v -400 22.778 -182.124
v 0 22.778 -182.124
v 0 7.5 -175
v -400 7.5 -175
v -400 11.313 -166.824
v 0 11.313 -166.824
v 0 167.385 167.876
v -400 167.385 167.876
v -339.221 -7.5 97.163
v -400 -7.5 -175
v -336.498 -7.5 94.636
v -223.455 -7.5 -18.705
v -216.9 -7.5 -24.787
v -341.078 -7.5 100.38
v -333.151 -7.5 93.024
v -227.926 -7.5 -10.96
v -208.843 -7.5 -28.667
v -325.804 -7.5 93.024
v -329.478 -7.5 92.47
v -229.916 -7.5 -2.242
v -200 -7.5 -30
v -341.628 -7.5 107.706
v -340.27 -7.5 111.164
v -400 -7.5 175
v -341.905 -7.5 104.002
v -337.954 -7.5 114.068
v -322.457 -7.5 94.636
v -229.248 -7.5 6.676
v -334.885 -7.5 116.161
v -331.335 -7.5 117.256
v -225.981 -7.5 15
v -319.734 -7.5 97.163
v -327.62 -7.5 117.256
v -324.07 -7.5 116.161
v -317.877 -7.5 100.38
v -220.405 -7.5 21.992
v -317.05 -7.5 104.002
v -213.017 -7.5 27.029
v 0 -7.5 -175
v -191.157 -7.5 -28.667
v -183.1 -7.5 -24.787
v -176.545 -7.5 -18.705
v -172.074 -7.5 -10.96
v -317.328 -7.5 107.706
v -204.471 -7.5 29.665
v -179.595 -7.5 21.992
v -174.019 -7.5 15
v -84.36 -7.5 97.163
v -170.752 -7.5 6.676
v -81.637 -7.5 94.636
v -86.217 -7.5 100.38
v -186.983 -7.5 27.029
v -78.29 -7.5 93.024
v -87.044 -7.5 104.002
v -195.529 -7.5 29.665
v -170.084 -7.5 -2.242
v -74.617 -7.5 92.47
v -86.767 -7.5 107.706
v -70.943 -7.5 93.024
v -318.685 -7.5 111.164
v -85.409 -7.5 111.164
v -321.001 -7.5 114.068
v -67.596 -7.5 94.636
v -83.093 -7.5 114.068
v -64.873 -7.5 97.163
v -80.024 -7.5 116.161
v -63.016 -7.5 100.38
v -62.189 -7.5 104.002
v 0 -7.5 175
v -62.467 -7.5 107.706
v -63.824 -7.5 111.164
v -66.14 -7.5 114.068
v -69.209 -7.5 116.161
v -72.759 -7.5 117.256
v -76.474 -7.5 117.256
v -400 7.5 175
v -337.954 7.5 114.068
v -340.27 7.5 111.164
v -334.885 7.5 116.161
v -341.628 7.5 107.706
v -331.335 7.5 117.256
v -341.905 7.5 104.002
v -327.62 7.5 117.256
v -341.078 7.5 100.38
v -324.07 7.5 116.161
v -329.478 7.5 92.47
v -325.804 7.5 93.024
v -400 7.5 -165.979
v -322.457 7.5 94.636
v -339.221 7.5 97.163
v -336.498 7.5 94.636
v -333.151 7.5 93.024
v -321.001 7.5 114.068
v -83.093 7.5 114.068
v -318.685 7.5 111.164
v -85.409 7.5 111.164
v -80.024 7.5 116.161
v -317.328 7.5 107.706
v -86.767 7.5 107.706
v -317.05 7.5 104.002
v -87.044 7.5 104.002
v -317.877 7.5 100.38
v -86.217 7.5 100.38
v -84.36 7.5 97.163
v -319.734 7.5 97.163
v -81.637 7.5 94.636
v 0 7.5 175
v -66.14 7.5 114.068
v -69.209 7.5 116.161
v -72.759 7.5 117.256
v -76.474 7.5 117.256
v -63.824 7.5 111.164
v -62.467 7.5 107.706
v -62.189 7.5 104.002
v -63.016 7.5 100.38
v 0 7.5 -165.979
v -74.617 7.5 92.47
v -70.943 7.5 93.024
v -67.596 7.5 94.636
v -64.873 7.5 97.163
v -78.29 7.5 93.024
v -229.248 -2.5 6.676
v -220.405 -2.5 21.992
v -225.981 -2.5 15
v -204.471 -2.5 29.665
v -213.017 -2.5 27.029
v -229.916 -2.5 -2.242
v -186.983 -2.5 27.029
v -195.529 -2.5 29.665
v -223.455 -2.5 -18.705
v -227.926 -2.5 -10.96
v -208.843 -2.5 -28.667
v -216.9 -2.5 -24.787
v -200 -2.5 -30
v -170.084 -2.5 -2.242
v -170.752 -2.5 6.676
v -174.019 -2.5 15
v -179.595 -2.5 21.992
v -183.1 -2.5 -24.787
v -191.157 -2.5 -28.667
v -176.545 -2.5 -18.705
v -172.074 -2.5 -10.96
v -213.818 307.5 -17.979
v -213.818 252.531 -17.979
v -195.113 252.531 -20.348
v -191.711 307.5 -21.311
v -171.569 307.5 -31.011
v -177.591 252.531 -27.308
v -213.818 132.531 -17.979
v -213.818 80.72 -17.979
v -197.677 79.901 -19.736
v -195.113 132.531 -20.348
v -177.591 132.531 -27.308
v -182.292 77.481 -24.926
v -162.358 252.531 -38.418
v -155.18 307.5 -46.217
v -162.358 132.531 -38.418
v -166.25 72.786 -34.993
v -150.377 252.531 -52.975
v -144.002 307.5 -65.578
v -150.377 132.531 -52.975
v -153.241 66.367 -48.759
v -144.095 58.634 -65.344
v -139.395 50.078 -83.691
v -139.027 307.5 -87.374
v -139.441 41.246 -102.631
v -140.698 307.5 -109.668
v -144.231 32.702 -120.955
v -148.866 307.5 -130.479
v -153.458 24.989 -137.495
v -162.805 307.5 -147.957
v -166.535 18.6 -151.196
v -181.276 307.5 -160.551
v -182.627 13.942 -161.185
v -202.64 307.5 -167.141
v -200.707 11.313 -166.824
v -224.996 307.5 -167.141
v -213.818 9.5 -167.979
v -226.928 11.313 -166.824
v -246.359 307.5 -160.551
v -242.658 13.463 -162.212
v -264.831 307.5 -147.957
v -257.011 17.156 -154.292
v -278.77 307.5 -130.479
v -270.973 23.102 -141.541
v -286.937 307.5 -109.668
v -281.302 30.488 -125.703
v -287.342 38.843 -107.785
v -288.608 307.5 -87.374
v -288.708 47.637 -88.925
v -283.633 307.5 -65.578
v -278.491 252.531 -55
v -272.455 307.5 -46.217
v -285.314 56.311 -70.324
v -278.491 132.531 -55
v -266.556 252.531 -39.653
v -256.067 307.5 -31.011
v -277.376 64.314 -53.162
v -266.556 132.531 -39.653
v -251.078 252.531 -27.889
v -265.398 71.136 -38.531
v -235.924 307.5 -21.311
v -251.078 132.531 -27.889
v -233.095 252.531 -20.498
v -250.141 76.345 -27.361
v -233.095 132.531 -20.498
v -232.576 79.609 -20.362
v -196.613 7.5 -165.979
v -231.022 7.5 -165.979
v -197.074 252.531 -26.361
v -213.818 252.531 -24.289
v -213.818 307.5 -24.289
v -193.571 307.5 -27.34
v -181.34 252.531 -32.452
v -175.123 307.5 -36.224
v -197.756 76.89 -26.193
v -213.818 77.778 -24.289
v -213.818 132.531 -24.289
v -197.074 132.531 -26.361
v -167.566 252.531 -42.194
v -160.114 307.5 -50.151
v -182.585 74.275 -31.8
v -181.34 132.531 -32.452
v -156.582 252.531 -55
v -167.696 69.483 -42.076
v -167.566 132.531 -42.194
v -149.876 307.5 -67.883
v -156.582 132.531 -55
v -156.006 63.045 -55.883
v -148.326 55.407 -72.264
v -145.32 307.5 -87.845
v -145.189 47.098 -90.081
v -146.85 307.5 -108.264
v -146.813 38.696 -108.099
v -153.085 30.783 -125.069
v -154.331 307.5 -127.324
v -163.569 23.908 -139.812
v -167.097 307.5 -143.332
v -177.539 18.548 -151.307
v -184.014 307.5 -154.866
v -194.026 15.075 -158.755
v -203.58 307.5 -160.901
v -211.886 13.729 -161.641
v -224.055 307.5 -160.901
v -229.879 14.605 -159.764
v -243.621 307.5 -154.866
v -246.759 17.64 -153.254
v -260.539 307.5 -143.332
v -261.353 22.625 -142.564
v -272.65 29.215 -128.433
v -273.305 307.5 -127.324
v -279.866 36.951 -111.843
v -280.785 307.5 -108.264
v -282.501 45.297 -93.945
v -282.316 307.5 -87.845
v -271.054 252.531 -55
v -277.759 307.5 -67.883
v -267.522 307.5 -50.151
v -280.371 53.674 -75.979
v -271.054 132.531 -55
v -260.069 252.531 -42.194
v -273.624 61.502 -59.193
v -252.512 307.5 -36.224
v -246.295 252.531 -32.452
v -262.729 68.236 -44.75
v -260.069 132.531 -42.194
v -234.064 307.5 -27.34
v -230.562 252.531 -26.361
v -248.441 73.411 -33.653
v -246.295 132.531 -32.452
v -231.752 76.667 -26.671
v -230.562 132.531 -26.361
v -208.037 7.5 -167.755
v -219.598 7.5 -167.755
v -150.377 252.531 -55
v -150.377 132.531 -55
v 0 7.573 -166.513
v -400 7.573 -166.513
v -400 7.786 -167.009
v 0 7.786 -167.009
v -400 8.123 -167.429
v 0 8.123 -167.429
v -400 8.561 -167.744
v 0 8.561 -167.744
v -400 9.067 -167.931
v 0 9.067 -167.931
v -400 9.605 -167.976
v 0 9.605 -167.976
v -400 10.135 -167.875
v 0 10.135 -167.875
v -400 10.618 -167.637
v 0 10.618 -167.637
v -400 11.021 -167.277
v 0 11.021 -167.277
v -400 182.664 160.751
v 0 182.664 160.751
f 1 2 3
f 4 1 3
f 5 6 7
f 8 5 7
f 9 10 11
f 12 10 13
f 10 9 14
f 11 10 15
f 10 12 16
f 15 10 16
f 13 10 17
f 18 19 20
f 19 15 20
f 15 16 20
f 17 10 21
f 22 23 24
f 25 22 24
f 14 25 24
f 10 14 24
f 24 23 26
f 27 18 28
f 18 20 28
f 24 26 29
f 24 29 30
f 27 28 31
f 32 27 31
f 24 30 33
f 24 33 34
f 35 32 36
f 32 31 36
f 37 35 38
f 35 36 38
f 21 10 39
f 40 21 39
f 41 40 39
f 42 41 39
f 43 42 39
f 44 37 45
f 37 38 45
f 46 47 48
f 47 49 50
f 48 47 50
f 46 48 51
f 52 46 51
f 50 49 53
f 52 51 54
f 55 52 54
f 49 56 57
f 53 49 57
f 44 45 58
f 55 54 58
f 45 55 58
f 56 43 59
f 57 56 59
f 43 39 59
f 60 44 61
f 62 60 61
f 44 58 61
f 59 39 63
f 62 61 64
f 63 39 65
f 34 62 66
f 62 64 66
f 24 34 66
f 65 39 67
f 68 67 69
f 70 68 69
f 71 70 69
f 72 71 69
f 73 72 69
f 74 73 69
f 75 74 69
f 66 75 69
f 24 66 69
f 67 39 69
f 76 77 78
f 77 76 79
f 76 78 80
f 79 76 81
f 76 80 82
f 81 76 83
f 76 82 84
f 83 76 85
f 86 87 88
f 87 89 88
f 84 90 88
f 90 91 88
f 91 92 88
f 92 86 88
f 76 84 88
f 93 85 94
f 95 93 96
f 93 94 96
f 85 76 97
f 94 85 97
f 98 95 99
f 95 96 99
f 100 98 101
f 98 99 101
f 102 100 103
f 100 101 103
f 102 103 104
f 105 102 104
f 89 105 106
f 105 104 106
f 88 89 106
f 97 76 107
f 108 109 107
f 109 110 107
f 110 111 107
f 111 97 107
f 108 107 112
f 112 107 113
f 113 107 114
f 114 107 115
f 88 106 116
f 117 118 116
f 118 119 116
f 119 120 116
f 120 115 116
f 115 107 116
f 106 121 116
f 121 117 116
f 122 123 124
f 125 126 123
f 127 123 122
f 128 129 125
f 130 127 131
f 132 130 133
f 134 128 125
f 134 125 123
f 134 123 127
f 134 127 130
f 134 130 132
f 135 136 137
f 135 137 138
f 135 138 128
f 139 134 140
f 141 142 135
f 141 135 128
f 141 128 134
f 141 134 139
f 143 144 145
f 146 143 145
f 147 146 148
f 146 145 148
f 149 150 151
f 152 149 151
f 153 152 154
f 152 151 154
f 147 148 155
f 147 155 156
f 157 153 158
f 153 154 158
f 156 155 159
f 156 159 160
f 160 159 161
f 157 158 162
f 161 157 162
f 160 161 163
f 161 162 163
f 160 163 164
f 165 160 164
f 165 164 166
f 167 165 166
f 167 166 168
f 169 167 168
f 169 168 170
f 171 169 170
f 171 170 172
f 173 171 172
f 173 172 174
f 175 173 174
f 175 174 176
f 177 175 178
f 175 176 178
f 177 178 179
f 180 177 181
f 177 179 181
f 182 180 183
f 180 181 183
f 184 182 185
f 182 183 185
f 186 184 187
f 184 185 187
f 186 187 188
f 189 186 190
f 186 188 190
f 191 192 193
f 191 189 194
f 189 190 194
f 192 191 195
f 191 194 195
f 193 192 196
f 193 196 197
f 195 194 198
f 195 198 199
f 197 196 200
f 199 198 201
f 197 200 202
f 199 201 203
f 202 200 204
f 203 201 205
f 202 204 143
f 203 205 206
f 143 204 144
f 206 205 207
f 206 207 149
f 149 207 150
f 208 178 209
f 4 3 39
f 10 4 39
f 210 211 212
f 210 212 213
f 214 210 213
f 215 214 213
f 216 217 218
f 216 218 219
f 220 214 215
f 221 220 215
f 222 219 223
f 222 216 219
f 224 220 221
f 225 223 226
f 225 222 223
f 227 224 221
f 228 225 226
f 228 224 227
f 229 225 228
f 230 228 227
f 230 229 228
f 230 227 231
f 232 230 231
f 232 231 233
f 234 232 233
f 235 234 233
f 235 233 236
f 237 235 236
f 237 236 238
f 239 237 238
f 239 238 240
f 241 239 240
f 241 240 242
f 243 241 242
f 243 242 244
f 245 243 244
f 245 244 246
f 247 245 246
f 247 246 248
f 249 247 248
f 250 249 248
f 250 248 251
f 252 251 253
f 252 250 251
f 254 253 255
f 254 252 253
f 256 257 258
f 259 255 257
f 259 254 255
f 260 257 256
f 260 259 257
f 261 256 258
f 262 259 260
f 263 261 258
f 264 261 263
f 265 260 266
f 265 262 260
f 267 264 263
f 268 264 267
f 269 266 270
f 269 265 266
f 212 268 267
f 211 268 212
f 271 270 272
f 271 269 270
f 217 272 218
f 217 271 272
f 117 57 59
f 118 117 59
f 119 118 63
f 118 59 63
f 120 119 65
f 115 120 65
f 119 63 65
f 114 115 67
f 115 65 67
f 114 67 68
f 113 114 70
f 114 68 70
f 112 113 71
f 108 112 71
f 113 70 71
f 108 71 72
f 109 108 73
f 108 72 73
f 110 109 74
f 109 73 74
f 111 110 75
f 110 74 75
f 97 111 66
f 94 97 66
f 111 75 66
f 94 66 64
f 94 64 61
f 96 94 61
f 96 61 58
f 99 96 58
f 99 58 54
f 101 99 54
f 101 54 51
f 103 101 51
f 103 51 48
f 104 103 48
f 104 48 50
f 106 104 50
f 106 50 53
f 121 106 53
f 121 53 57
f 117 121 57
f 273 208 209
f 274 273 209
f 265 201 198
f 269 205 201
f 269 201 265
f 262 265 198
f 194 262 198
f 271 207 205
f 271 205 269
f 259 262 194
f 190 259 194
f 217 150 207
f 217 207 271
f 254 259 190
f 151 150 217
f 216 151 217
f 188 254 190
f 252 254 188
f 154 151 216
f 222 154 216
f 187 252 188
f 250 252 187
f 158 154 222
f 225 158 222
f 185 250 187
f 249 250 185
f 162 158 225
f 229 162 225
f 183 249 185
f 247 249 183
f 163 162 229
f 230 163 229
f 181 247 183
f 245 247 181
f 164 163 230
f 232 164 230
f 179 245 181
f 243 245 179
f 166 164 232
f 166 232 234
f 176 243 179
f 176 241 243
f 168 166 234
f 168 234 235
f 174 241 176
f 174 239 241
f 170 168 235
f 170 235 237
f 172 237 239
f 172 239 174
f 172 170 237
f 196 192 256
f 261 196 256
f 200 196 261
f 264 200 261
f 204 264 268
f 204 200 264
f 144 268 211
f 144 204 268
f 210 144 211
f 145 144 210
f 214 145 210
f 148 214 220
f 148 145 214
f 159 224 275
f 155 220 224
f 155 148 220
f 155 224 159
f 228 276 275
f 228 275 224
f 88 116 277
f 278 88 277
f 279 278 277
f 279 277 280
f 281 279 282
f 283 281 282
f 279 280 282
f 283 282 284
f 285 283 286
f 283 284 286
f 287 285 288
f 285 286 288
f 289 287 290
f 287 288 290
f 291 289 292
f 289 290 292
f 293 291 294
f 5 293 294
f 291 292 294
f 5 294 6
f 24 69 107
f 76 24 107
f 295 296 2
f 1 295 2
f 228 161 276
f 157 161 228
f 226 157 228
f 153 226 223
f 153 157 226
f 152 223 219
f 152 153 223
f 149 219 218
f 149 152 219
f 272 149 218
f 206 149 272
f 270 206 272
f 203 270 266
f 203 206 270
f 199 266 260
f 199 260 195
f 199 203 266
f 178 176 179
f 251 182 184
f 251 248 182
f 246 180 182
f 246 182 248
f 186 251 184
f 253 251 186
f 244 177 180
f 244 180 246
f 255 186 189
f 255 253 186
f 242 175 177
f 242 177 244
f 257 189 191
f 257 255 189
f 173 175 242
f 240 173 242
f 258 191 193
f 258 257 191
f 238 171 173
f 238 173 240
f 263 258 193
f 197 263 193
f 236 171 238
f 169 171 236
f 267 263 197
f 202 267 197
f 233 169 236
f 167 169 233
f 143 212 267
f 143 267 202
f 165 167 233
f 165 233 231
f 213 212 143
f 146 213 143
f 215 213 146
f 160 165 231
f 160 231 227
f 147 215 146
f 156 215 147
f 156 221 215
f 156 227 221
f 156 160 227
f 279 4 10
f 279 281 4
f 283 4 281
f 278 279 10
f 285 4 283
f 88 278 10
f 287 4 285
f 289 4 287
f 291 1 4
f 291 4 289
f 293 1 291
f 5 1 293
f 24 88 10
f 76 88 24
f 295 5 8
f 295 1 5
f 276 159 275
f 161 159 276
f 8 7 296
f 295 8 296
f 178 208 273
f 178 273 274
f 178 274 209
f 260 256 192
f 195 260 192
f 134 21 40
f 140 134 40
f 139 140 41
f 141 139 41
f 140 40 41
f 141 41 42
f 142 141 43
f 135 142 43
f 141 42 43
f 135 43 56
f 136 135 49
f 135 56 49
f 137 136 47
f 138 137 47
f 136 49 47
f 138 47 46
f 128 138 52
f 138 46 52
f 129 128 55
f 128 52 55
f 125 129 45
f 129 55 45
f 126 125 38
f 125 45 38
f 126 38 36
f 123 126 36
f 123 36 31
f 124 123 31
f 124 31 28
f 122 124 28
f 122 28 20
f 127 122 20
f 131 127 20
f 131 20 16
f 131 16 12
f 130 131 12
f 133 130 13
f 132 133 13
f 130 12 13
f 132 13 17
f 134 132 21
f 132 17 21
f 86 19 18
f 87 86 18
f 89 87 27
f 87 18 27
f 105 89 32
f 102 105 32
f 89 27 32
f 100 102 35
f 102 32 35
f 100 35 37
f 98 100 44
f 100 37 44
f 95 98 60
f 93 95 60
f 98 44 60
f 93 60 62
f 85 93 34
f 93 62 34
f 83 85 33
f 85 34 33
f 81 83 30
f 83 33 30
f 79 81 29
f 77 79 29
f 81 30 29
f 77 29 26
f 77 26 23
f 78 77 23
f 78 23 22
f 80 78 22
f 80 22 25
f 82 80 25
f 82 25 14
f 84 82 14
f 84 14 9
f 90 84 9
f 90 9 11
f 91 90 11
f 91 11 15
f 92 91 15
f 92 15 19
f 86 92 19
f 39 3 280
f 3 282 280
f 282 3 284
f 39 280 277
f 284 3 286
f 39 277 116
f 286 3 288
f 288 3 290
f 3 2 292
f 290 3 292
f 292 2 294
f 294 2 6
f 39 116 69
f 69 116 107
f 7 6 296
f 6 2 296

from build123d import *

# Parameters (mm, degrees)
BOSS_EXTRUDE1_DEPTH = 400
SKETCH3_R           = 29.999999999999996
CUT_EXTRUDE1_DEPTH  = 5
SKETCH4_R           = 12.46239114177459
SKETCH4_R_2         = 12.462391141774633
CUT_EXTRUDE2_DEPTH  = 25
SKETCH5_R           = 75.00000000000003
SKETCH5_R_2         = 68.68991189678029
BOSS_EXTRUDE3_DEPTH = 300
CUT_EXTRUDE3_START  = -500
CUT_EXTRUDE3_DEPTH  = 500
CUT_EXTRUDE4_DEPTH  = 50


with BuildPart() as part:
    # Sketch2 → Boss-Extrude1 (new body)
    with BuildSketch(Plane(origin=(0, 0, 0), x_dir=(0, 0, -1), z_dir=(1, 0, 0))):
        with BuildLine():
            Line((166.82381951615696, 11.312615574073371), (-167.875551318356, 167.38549537386393))
            Line((-167.875551318356, 167.38549537386393), (-160.75110263671203, 182.66392487646505))
            Line((-160.75110263671203, 182.66392487646505), (182.12444868164403, 22.778429502601124))
            Line((182.12444868164403, 22.778429502601124), (174.99999999999997, 7.500000000000001))
            Line((174.99999999999997, 7.500000000000001), (174.99999999999997, -7.499999999999999))
            Line((174.99999999999997, -7.499999999999999), (-175.00000000000003, -7.499999999999999))
            Line((-175.00000000000003, -7.499999999999999), (-175.00000000000003, 7.500000000000001))
            Line((-175.00000000000003, 7.500000000000001), (165.97858299267557, 7.500000000000001))
            ThreePointArc((165.97858299267557, 7.500000000000001), (167.9311750069156, 9.067120772123808), (166.82381951615696, 11.312615574073371))
        make_face()
    extrude(amount=-BOSS_EXTRUDE1_DEPTH)

    # Sketch3 → Cut-Extrude1 (cut)
    with BuildSketch(Plane.XZ.offset(7.499999999999999)):
        with Locations(Location((-200, 0, 0), (0, 0, 270))):
            Circle(SKETCH3_R)
    extrude(amount=-CUT_EXTRUDE1_DEPTH, mode=Mode.SUBTRACT)

    # Sketch4 → Cut-Extrude2 (cut)
    with BuildSketch(Plane.XZ.offset(7.499999999999999)):
        with Locations(Location((-329.47757363975893, 104.93281760237586, 0), (0, 0, 270))):
            Circle(SKETCH4_R)
        with Locations(Location((-74.6165788863995, 104.93281760237586, 0), (0, 0, 270))):
            Circle(SKETCH4_R_2)
    extrude(amount=-CUT_EXTRUDE2_DEPTH, mode=Mode.SUBTRACT)


with BuildPart() as body_2:
    # Sketch5 → Boss-Extrude3 (new body)
    with BuildSketch(Plane(origin=(0, 7.500000000000001, 0), x_dir=(1, 0, 0), z_dir=(0, 1, 0))):
        with Locations(Location((-213.81776477578452, 92.9785829926757, 0), (0, 0, 270))):
            Circle(SKETCH5_R)
        with Locations(Location((-213.81776477578452, 92.9785829926757, 0), (0, 0, 270))):
            Circle(SKETCH5_R_2, mode=Mode.SUBTRACT)
    extrude(amount=BOSS_EXTRUDE3_DEPTH)

    # Sketch6 → Cut-Extrude3 (cut)
    with BuildSketch(Plane.ZY.offset(400).offset(CUT_EXTRUDE3_START)):
        with BuildLine():
            Line((0.5258659010995148, 89.34905547396865), (-166.82381951615696, 11.31261557407337))
            ThreePointArc((-166.82381951615696, 11.31261557407337), (-167.9311750069156, 9.067120772123864), (-165.97858299267568, 7.5))
            Line((-165.97858299267568, 7.5), (-3.0663718706783194, 7.500000000000001))
            Line((-3.0663718706783194, 7.500000000000001), (0.5258659010995148, 89.34905547396865))
        make_face()
    extrude(amount=CUT_EXTRUDE3_DEPTH, mode=Mode.SUBTRACT)


with BuildPart() as cut_extrude3_piece_1:
    # of the separate pieces the step leaves, piece 1, a body of its own (cut_extrude3_pieces)
    add(body_2.part.solids().sort_by_distance((-200.707423713, 11.312615574, -166.823819516))[0])

    # Sketch8 → Cut-Extrude4 (cut)
    with BuildSketch(Plane.XY.offset(-4.999999999999977)):
        Polygon((-280.3769731102271, 252.5305411121489), (-150.37697311022706, 252.5305411121489), (-150.37697311022706, 132.53054111214894), (-280.376973110227, 132.5305411121489), align=None)
    extrude(amount=-CUT_EXTRUDE4_DEPTH, mode=Mode.SUBTRACT)


with BuildPart() as cut_extrude3_piece_2:
    # of the separate pieces the step leaves, piece 2, a body of its own (cut_extrude3_pieces)
    add(body_2.part.solids().sort_by_distance((-196.613114242, 7.5, -165.978582993))[0])


solid = Compound([part.part, cut_extrude3_piece_1.part, cut_extrude3_piece_2.part])
